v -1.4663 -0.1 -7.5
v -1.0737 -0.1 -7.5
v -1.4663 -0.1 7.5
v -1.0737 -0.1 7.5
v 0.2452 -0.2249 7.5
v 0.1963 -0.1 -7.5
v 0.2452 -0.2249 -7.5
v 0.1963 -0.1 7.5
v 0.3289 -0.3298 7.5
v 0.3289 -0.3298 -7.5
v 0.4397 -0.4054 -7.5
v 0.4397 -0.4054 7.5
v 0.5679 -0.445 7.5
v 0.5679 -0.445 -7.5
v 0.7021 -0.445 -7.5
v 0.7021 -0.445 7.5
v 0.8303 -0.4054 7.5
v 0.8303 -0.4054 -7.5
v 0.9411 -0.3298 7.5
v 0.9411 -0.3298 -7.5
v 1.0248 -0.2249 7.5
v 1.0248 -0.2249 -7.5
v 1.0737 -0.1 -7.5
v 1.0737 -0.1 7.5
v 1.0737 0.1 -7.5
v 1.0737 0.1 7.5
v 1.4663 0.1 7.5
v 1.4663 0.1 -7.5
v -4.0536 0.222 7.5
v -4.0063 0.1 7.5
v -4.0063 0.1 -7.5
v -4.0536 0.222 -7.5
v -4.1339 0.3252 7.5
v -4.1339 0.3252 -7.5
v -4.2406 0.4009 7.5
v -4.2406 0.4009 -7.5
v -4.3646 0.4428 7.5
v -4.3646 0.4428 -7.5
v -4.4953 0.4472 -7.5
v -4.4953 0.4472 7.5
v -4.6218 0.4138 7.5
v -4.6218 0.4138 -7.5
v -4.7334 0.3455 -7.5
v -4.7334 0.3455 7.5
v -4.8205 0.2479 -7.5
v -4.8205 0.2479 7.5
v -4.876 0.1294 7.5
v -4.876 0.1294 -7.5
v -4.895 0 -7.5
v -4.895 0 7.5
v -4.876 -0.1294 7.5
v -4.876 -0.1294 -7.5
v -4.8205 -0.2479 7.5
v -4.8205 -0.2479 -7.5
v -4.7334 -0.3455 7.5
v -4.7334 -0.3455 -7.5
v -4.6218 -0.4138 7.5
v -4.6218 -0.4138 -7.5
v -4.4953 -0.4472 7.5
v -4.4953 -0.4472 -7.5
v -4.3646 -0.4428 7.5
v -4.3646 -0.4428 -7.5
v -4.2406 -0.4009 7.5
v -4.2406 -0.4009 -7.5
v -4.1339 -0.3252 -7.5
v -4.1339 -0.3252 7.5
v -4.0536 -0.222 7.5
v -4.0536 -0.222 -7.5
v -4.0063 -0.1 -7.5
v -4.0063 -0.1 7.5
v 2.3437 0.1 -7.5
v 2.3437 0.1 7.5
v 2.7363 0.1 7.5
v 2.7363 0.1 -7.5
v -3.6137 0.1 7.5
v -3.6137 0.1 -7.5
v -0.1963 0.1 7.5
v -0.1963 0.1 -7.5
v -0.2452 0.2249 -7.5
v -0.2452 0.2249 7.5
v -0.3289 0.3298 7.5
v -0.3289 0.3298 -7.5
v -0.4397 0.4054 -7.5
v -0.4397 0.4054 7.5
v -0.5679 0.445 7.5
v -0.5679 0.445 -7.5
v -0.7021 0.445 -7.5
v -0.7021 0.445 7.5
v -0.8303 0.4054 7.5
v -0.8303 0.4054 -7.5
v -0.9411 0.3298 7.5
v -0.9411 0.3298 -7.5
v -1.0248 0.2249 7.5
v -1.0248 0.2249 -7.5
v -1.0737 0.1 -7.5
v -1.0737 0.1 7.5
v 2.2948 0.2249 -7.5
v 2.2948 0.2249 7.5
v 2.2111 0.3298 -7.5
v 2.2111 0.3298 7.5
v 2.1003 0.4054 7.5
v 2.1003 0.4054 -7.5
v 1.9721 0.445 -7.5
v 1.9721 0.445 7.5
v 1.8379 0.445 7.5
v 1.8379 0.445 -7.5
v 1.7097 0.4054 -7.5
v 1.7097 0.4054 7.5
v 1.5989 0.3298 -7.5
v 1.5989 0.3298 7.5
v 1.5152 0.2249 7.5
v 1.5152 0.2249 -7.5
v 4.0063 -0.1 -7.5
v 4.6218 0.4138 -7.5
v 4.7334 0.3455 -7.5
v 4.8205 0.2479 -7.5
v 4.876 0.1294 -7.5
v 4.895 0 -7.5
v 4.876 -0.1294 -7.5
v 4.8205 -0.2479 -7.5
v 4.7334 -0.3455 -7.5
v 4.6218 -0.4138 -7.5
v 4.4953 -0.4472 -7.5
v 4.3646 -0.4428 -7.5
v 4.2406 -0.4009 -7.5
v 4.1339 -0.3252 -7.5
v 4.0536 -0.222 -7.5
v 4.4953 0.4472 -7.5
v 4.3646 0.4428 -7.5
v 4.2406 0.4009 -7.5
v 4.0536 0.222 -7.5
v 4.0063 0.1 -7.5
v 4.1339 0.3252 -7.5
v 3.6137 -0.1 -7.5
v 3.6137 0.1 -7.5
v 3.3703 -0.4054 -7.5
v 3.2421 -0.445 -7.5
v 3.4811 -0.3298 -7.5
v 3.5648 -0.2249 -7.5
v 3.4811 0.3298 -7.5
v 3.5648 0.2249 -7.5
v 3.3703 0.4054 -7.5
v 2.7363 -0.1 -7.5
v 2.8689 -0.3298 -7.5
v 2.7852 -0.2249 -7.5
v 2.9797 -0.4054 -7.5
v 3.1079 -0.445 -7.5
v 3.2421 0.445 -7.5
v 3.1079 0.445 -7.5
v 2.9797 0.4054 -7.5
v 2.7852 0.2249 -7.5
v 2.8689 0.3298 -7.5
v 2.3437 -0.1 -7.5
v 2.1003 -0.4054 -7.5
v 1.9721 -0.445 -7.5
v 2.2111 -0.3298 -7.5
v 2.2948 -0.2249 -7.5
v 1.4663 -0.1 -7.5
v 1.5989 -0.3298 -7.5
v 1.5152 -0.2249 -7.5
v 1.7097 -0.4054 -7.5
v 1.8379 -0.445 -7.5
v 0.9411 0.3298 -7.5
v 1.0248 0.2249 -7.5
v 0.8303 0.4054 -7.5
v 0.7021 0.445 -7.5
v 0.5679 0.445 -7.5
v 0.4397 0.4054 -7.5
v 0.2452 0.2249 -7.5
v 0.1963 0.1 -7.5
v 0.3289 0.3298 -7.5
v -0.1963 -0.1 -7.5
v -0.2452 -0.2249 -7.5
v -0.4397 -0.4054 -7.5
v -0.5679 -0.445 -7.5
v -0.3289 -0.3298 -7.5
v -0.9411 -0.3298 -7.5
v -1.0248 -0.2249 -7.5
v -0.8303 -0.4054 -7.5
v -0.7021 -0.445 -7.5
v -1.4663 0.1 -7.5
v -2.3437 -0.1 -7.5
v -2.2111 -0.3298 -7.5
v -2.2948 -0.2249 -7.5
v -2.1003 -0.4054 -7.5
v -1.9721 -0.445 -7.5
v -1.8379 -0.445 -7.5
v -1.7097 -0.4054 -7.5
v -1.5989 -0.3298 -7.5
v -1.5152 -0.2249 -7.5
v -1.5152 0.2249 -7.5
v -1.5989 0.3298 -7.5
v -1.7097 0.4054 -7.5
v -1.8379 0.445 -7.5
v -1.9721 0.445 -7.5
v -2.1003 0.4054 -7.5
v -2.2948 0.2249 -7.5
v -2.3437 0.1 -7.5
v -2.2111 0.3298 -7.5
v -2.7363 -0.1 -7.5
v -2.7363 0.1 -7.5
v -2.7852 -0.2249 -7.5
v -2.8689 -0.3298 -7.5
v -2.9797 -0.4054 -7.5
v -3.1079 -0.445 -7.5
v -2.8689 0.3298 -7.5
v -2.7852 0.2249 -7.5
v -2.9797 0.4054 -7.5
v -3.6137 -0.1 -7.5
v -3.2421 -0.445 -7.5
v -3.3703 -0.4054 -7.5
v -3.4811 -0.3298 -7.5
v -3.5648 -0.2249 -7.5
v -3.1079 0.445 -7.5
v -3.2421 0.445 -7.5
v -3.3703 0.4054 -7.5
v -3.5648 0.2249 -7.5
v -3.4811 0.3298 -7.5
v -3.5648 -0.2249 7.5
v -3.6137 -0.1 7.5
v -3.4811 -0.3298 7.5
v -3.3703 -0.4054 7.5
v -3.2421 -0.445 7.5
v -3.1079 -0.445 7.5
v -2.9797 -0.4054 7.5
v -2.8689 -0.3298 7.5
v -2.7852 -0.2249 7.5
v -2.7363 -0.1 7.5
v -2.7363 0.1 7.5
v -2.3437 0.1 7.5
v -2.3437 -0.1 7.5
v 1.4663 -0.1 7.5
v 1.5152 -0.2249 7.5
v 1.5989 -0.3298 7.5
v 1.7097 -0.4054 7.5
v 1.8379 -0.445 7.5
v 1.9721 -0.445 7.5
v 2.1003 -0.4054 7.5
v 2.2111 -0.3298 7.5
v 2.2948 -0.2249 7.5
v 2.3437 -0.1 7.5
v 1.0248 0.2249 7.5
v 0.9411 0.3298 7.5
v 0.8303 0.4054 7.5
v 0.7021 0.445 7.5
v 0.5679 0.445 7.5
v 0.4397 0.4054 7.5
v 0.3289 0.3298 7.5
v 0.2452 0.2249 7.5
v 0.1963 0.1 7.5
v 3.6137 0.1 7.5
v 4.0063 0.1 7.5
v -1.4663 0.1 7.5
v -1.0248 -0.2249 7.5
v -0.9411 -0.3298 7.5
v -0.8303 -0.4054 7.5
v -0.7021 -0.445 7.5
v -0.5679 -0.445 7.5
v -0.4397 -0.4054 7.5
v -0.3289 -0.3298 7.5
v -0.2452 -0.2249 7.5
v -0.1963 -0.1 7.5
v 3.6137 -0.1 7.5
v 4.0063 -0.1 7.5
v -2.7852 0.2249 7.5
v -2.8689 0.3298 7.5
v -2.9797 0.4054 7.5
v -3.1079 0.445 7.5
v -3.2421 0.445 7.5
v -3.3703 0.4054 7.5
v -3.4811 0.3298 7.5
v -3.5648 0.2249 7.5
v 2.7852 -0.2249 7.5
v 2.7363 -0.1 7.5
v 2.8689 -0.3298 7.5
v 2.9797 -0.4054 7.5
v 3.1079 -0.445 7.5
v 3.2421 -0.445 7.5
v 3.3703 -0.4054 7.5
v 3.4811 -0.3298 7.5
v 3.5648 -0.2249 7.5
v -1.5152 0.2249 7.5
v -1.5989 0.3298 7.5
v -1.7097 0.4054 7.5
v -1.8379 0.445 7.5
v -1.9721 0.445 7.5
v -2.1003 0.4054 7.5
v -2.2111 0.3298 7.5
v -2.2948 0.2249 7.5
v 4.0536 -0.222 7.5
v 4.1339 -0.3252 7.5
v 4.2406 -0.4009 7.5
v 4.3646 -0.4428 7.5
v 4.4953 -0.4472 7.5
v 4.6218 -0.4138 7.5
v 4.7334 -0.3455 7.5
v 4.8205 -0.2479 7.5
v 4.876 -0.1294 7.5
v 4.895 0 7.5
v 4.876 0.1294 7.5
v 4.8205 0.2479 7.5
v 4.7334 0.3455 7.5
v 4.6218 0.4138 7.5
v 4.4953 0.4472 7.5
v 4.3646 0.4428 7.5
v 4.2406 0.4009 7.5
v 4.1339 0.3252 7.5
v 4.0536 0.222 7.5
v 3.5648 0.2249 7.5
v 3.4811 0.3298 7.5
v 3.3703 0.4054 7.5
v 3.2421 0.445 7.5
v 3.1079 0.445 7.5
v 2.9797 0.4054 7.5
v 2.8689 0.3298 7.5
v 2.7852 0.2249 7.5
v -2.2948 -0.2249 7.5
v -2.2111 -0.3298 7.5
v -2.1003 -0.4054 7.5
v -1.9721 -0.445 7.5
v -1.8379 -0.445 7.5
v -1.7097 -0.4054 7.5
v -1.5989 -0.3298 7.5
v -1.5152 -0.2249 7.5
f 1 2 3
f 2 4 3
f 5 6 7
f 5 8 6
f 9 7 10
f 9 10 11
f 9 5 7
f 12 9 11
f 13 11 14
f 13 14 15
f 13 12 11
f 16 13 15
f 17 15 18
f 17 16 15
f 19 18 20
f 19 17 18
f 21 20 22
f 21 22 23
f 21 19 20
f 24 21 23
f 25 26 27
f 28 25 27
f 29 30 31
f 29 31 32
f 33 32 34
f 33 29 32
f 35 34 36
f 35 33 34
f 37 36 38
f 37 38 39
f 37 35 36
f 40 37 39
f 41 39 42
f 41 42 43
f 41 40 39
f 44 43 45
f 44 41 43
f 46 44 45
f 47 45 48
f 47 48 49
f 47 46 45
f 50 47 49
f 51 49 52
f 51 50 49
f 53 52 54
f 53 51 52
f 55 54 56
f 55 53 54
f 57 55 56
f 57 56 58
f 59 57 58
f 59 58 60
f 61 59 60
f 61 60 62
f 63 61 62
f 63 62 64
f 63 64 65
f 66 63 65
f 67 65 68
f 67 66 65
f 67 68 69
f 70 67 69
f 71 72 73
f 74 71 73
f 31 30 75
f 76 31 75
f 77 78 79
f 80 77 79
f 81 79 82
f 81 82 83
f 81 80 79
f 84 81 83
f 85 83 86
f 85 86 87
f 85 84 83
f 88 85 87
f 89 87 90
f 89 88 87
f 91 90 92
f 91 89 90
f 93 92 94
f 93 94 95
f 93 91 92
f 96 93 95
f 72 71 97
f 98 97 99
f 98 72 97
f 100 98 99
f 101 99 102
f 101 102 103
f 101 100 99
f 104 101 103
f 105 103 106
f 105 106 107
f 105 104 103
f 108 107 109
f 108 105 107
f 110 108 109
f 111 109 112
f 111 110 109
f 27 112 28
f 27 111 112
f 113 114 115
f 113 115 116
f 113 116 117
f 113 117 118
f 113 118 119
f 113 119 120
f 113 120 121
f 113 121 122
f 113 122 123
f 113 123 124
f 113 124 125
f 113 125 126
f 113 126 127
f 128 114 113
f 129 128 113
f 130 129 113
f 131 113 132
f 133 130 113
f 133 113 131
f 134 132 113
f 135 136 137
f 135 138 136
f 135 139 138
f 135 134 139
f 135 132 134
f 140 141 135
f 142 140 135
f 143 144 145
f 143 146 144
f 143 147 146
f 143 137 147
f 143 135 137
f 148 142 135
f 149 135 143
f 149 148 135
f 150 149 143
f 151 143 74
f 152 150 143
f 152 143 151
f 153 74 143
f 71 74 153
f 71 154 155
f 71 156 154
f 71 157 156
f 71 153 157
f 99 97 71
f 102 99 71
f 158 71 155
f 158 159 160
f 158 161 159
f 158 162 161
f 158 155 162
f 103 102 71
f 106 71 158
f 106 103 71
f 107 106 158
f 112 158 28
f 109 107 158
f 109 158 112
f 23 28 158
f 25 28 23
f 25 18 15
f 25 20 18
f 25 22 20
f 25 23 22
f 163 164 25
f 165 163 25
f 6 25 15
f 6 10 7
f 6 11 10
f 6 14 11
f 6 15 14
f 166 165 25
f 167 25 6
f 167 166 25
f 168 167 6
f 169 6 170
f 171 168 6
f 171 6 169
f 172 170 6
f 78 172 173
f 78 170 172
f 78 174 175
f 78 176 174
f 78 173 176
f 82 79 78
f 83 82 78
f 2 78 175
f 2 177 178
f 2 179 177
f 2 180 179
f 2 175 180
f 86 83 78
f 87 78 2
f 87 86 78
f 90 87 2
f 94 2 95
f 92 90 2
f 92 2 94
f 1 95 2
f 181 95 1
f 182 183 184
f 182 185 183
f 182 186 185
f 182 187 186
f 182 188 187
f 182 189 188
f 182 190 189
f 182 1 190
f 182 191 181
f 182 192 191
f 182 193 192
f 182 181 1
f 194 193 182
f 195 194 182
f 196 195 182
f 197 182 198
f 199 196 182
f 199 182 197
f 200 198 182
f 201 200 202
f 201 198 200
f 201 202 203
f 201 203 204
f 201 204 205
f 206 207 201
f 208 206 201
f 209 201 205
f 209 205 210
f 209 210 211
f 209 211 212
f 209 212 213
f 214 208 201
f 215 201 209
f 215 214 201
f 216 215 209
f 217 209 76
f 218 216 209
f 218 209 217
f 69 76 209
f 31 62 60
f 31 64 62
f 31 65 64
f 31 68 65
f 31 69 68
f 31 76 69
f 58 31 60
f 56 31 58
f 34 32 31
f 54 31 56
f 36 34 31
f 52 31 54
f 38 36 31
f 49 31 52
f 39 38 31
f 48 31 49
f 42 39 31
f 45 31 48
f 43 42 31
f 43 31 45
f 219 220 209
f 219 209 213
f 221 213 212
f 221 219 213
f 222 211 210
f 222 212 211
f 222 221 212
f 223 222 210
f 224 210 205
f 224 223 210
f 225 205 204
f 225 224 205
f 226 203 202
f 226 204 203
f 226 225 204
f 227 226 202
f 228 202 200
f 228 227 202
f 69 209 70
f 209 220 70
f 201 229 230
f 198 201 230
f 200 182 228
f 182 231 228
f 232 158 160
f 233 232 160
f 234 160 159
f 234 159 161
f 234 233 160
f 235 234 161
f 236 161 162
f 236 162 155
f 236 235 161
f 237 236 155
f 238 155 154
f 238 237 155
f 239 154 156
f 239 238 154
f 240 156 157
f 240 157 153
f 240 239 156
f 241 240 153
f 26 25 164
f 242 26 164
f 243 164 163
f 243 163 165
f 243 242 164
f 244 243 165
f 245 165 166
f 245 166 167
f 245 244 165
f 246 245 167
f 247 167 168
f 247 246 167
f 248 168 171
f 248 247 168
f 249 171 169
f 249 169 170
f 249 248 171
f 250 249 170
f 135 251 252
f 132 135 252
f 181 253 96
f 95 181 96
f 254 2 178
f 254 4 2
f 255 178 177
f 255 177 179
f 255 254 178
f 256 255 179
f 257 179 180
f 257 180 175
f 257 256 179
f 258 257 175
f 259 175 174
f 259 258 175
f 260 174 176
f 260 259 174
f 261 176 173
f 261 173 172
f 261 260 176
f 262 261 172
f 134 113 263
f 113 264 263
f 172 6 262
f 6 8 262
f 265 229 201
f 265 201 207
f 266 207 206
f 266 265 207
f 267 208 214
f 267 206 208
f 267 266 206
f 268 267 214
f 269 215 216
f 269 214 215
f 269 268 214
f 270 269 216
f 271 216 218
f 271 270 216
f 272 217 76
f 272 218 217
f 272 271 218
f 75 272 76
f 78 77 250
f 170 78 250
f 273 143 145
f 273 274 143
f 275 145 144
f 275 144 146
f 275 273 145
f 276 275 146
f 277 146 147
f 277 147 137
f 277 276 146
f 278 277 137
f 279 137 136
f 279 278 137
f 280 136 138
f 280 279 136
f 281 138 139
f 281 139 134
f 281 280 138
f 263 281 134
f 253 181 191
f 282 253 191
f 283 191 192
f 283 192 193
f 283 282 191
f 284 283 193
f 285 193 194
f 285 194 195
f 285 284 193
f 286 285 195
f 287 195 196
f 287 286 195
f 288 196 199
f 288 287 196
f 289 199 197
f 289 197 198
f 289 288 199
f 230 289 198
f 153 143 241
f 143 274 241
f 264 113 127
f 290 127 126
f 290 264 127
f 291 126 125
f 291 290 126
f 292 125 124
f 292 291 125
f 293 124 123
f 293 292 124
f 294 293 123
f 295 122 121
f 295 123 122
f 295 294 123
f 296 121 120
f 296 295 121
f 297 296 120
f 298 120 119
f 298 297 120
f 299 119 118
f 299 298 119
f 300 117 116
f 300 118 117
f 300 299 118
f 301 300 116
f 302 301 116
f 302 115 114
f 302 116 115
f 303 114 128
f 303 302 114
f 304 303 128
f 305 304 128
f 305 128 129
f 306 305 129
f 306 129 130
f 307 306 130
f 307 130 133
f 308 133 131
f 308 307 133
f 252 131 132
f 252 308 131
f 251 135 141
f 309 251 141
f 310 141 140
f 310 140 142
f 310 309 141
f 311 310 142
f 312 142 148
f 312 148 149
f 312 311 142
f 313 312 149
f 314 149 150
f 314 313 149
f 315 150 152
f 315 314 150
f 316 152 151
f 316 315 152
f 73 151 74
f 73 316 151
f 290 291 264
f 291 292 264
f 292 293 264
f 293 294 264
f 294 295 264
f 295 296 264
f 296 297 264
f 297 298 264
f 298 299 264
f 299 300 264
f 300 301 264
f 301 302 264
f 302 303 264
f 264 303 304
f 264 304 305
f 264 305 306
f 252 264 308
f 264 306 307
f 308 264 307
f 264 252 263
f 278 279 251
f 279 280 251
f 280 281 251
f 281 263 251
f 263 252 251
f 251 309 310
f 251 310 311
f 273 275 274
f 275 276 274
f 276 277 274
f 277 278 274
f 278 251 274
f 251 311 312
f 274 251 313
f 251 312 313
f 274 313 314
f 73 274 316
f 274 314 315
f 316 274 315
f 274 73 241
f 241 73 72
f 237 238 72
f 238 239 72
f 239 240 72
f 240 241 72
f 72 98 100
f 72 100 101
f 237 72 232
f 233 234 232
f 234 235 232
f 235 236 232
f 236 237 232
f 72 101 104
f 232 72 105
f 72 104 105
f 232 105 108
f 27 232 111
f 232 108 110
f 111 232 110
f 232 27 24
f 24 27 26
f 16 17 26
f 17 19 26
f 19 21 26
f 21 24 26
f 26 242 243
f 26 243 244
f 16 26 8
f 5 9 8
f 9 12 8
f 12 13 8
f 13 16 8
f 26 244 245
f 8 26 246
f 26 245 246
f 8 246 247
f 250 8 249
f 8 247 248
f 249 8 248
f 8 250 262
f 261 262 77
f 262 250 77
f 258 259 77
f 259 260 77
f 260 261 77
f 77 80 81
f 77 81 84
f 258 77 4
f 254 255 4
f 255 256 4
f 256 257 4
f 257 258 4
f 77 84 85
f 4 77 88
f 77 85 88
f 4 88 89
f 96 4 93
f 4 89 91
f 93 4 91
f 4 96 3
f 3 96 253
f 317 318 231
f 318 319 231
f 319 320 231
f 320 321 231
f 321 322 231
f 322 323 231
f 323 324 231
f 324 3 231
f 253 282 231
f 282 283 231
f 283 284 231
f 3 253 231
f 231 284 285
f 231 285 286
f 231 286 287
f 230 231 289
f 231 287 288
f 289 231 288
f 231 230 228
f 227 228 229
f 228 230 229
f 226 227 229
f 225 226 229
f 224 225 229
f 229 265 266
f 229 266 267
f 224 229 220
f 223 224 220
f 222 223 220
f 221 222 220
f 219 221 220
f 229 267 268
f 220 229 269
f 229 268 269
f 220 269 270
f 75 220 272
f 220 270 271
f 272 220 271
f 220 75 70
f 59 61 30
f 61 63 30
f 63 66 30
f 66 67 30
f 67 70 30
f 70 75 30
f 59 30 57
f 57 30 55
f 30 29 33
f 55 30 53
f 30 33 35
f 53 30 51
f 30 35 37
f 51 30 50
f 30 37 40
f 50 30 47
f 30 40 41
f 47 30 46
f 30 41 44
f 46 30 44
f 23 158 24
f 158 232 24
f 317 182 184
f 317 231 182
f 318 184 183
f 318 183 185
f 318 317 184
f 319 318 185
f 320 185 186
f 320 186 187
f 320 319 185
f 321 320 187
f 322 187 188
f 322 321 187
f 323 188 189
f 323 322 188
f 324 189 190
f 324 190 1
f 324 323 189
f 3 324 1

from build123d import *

# Parameters (mm, degrees)
ESQUISSE1_R                = 0.45
BOSS_EXTRU_1_DEPTH         = 7.5
R_P_TITION_LIN_AIRE1_COUNT = 8
R_P_TITION_LIN_AIRE1_PITCH = 1.27
BOSS_EXTRU_2_DEPTH         = 7.5
R_P_TITION_LIN_AIRE2_COUNT = 7
R_P_TITION_LIN_AIRE2_PITCH = 1.27


with BuildPart() as part:
    # Esquisse1 → Boss.-Extru.1 (new, symmetric)
    with BuildSketch(Plane.XY):
        with Locations((-4.445, 0)):
            Circle(ESQUISSE1_R)
    extrude(amount=BOSS_EXTRU_1_DEPTH, both=True)


with BuildPart() as r_p_tition_lin_aire1_1:
    # Répétition linéaire1: pattern copy
    add(part.part.moved(Location(Vector(1, 0, 0) * (1 * R_P_TITION_LIN_AIRE1_PITCH))))


with BuildPart() as r_p_tition_lin_aire1_2:
    # Répétition linéaire1: pattern copy
    add(part.part.moved(Location(Vector(1, 0, 0) * (2 * R_P_TITION_LIN_AIRE1_PITCH))))


with BuildPart() as r_p_tition_lin_aire1_3:
    # Répétition linéaire1: pattern copy
    add(part.part.moved(Location(Vector(1, 0, 0) * (3 * R_P_TITION_LIN_AIRE1_PITCH))))


with BuildPart() as r_p_tition_lin_aire1_4:
    # Répétition linéaire1: pattern copy
    add(part.part.moved(Location(Vector(1, 0, 0) * (4 * R_P_TITION_LIN_AIRE1_PITCH))))


with BuildPart() as r_p_tition_lin_aire1_5:
    # Répétition linéaire1: pattern copy
    add(part.part.moved(Location(Vector(1, 0, 0) * (5 * R_P_TITION_LIN_AIRE1_PITCH))))


with BuildPart() as r_p_tition_lin_aire1_6:
    # Répétition linéaire1: pattern copy
    add(part.part.moved(Location(Vector(1, 0, 0) * (6 * R_P_TITION_LIN_AIRE1_PITCH))))


with BuildPart() as r_p_tition_lin_aire1_7:
    # Répétition linéaire1: pattern copy
    add(part.part.moved(Location(Vector(1, 0, 0) * (7 * R_P_TITION_LIN_AIRE1_PITCH))))


with BuildPart() as part_1:
    add(part.part)

    add(r_p_tition_lin_aire1_1.part)  # Boss.-Extru.2 merges Répétition linéaire1_1
    # Esquisse2 → Boss.-Extru.2 (add, symmetric)
    with BuildSketch(Plane.XY):
        with BuildLine():
            Line((-4.006251781, 0.1), (-3.613748219, 0.1))
            ThreePointArc((-3.613748219, 0.1), (-3.625, 0), (-3.613748219, -0.1))
            Line((-3.613748219, -0.1), (-4.006251781, -0.1))
            ThreePointArc((-4.006251781, -0.1), (-3.995, 0), (-4.006251781, 0.1))
        make_face()
    boss_extru_2 = extrude(amount=BOSS_EXTRU_2_DEPTH, both=True)

    add(r_p_tition_lin_aire1_2.part)  # Répétition linéaire2 merges Répétition linéaire1_2

    add(r_p_tition_lin_aire1_3.part)  # Répétition linéaire2 merges Répétition linéaire1_3

    add(r_p_tition_lin_aire1_4.part)  # Répétition linéaire2 merges Répétition linéaire1_4

    add(r_p_tition_lin_aire1_5.part)  # Répétition linéaire2 merges Répétition linéaire1_5

    add(r_p_tition_lin_aire1_6.part)  # Répétition linéaire2 merges Répétition linéaire1_6

    add(r_p_tition_lin_aire1_7.part)  # Répétition linéaire2 merges Répétition linéaire1_7
    # Répétition linéaire2: Boss.-Extru.2 ×7
    with Locations(*[(i * R_P_TITION_LIN_AIRE2_PITCH, 0, 0) for i in range(1, R_P_TITION_LIN_AIRE2_COUNT)]):
        add(boss_extru_2)


solid = part_1.part
